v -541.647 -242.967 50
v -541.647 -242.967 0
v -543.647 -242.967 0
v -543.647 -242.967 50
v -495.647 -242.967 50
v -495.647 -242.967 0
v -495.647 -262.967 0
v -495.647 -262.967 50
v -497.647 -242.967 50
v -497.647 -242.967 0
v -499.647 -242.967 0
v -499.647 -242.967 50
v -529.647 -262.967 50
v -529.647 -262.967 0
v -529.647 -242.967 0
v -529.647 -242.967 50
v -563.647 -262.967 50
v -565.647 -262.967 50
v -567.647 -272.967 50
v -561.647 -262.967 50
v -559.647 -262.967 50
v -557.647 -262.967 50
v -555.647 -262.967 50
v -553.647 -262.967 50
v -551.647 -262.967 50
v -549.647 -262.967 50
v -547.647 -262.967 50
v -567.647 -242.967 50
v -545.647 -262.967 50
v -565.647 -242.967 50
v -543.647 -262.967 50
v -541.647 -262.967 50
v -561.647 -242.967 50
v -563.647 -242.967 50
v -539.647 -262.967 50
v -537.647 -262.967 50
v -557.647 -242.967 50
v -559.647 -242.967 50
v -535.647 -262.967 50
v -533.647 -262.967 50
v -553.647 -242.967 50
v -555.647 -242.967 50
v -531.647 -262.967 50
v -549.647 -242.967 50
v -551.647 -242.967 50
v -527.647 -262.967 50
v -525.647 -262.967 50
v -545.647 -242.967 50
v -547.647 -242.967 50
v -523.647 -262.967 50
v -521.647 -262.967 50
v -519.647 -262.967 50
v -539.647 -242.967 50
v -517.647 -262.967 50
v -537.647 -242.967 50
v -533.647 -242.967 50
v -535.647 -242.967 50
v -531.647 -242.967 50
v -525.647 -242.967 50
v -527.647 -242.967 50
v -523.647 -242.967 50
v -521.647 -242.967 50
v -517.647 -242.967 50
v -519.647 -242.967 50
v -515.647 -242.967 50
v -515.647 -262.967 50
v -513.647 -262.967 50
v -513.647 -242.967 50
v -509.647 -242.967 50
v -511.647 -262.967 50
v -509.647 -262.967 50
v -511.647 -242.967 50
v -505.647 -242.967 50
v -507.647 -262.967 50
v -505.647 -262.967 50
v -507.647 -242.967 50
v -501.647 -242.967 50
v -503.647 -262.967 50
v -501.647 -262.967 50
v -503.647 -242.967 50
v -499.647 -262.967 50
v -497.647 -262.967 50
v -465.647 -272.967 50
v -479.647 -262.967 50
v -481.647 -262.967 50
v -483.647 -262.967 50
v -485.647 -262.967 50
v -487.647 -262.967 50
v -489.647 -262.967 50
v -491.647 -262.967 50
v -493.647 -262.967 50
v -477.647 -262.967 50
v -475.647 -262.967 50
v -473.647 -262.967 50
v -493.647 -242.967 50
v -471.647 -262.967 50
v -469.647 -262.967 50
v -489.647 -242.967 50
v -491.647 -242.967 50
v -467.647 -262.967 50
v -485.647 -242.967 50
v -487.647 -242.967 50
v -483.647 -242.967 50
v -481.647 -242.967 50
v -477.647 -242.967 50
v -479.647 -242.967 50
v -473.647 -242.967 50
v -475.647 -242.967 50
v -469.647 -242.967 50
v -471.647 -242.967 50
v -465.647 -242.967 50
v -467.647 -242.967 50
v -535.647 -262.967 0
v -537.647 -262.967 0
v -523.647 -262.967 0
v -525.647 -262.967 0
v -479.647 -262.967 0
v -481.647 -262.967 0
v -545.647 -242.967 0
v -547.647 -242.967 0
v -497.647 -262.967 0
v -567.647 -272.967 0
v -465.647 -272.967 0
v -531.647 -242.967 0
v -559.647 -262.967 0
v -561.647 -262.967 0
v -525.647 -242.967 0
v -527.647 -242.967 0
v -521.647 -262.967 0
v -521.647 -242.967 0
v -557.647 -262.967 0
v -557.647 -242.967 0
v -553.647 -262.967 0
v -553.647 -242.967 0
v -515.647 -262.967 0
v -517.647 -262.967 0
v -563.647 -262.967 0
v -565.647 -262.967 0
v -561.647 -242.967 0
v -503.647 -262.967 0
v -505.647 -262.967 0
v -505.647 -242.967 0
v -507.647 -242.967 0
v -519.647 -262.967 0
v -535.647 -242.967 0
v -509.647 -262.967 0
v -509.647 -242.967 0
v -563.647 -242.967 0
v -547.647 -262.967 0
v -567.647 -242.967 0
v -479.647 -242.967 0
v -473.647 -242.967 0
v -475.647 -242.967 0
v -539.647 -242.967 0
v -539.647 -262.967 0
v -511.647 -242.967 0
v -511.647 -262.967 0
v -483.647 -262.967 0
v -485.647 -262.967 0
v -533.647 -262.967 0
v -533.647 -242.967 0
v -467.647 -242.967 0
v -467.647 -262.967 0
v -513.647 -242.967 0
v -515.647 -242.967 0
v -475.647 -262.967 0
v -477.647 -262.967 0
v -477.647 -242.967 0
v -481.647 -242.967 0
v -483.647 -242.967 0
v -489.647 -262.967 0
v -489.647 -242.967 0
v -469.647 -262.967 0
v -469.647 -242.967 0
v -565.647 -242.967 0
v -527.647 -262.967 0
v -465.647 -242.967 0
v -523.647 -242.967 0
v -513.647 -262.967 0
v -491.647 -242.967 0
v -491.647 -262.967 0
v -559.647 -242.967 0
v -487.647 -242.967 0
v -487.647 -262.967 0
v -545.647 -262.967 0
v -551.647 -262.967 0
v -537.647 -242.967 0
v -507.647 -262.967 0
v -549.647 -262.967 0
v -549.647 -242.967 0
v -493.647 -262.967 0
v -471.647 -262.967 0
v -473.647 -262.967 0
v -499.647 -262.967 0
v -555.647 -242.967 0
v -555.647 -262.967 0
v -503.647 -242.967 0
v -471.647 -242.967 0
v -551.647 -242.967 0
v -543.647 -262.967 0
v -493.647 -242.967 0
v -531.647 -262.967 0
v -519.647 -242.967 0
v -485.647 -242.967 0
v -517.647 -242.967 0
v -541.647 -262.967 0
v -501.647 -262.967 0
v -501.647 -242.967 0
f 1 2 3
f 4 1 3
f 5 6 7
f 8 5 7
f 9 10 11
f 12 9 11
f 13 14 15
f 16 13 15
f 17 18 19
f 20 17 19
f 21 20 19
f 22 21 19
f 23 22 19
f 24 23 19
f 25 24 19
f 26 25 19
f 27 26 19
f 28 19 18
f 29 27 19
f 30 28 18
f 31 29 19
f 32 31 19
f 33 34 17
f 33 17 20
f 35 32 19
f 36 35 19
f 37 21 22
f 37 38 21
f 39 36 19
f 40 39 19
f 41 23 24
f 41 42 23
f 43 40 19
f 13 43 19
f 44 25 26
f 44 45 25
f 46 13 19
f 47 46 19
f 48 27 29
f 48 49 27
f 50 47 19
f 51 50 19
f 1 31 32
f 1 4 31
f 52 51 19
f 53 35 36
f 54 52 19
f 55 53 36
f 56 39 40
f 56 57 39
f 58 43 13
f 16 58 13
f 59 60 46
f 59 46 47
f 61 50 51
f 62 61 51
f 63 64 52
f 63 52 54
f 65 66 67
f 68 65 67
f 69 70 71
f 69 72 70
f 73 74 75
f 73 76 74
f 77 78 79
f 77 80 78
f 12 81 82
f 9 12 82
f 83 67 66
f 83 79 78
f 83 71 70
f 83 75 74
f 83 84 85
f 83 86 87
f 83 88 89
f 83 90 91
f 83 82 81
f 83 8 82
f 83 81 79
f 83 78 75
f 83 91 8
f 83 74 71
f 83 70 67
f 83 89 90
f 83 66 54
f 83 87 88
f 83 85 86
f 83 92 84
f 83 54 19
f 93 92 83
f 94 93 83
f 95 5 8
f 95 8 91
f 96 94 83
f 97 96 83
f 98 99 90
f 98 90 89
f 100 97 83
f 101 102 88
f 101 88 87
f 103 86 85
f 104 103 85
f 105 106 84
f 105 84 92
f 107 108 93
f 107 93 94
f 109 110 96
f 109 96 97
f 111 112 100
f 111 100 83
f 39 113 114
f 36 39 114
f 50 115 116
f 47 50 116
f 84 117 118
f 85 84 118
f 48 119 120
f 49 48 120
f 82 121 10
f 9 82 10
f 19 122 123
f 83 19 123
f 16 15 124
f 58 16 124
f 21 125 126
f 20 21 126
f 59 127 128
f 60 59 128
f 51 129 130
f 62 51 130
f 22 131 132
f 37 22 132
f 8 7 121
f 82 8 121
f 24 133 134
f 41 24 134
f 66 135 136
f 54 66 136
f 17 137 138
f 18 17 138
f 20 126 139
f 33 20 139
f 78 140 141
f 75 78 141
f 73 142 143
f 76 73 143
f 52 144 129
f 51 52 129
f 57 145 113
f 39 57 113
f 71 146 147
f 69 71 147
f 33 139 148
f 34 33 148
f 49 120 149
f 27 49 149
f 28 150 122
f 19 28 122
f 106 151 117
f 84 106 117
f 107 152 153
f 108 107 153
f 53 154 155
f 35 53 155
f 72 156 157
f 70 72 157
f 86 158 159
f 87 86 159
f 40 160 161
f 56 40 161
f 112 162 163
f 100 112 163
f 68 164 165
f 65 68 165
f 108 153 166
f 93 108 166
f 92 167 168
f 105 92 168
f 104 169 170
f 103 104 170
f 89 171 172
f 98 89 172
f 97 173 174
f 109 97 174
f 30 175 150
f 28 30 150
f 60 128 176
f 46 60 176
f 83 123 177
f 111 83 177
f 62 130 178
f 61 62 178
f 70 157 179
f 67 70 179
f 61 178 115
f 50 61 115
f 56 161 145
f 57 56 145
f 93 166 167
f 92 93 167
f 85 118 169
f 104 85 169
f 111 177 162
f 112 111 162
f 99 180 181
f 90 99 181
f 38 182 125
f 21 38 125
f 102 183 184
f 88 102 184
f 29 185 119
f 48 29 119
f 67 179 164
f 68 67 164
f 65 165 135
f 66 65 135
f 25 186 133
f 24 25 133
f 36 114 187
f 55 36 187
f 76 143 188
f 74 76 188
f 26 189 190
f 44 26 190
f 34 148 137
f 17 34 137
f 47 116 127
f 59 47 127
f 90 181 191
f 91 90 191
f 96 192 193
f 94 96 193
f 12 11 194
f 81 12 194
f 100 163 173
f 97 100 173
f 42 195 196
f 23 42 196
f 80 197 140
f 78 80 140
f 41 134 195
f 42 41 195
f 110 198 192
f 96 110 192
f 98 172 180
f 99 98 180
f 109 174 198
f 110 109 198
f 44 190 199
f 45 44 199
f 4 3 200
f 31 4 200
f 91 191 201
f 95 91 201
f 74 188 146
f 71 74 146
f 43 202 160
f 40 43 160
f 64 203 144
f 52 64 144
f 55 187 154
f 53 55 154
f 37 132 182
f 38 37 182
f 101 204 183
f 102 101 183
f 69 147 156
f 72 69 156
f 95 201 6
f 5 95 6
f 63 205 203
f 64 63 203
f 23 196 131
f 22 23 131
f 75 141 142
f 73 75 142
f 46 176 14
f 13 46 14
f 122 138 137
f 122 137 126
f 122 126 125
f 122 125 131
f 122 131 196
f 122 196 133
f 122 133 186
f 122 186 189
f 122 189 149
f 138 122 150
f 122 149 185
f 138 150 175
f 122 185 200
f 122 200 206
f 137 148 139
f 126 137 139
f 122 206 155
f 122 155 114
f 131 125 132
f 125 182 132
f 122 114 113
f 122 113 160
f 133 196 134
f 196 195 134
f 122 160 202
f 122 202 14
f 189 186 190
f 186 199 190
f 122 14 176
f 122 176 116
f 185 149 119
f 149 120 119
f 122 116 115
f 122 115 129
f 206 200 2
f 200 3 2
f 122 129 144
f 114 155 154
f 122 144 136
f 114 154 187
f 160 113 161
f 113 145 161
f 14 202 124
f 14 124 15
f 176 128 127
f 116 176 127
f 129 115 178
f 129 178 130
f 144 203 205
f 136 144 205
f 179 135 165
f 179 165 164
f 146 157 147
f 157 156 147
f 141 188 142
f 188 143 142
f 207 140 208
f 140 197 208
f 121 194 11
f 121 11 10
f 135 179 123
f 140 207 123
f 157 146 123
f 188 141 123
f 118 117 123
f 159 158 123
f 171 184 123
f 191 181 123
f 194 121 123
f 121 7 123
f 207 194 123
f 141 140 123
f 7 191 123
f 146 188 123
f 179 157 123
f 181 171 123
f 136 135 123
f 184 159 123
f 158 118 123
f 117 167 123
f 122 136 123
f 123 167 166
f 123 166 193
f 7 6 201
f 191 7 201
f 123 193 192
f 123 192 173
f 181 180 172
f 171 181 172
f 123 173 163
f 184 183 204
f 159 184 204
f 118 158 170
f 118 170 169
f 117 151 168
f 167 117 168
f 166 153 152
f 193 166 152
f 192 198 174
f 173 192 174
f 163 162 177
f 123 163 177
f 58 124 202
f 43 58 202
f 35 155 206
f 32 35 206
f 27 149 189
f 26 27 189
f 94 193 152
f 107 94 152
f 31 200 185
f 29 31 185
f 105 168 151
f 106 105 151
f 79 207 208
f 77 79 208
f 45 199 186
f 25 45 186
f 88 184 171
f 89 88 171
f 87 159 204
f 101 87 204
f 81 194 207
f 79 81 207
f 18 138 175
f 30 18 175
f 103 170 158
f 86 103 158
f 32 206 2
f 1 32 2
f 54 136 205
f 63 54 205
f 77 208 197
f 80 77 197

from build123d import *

# Parameters (mm, degrees)
F1_DEPTH = 50


with BuildPart() as f1:
    # F0 (on Top) → F1 (new body)
    with BuildSketch(Plane.XY):
        Polygon((-567.647423, -242.966514), (-567.647423, -272.966514), (-465.647423, -272.966514), (-465.647423, -242.966514), (-467.647423, -242.966514), (-467.647423, -262.966514), (-469.647423, -262.966514), (-469.647423, -242.966514), (-471.647423, -242.966514), (-471.647423, -262.966514), (-473.647423, -262.966514), (-473.647423, -242.966514), (-475.647423, -242.966514), (-475.647423, -262.966514), (-477.647423, -262.966514), (-477.647423, -242.966514), (-479.647423, -242.966514), (-479.647423, -262.966514), (-481.647423, -262.966514), (-481.647423, -242.966514), (-483.647423, -242.966514), (-483.647423, -262.966514), (-485.647423, -262.966514), (-485.647423, -242.966514), (-487.647423, -242.966514), (-487.647423, -262.966514), (-489.647423, -262.966514), (-489.647423, -242.966514), (-491.647423, -242.966514), (-491.647423, -262.966514), (-493.647423, -262.966514), (-493.647423, -242.966514), (-495.647423, -242.966514), (-495.647423, -262.966514), (-497.647423, -262.966514), (-497.647423, -242.966514), (-499.647423, -242.966514), (-499.647423, -262.966514), (-501.647423, -262.966514), (-501.647423, -242.966514), (-503.647423, -242.966514), (-503.647423, -262.966514), (-505.647423, -262.966514), (-505.647423, -242.966514), (-507.647423, -242.966514), (-507.647423, -262.966514), (-509.647423, -262.966514), (-509.647423, -242.966514), (-511.647423, -242.966514), (-511.647423, -262.966514), (-513.647423, -262.966514), (-513.647423, -242.966514), (-515.647423, -242.966514), (-515.647423, -262.966514), (-517.647423, -262.966514), (-517.647423, -242.966514), (-519.647423, -242.966514), (-519.647423, -262.966514), (-521.647423, -262.966514), (-521.647423, -242.966514), (-523.647423, -242.966514), (-523.647423, -262.966514), (-525.647423, -262.966514), (-525.647423, -242.966514), (-527.647423, -242.966514), (-527.647423, -262.966514), (-529.647423, -262.966514), (-529.647423, -242.966514), (-531.647423, -242.966514), (-531.647423, -262.966514), (-533.647423, -262.966514), (-533.647423, -242.966514), (-535.647423, -242.966514), (-535.647423, -262.966514), (-537.647423, -262.966514), (-537.647423, -242.966514), (-539.647423, -242.966514), (-539.647423, -262.966514), (-541.647423, -262.966514), (-541.647423, -242.966514), (-543.647423, -242.966514), (-543.647423, -262.966514), (-545.647423, -262.966514), (-545.647423, -242.966514), (-547.647423, -242.966514), (-547.647423, -262.966514), (-549.647423, -262.966514), (-549.647423, -242.966514), (-551.647423, -242.966514), (-551.647423, -262.966514), (-553.647423, -262.966514), (-553.647423, -242.966514), (-555.647423, -242.966514), (-555.647423, -262.966514), (-557.647423, -262.966514), (-557.647423, -242.966514), (-559.647423, -242.966514), (-559.647423, -262.966514), (-561.647423, -262.966514), (-561.647423, -242.966514), (-563.647423, -242.966514), (-563.647423, -262.966514), (-565.647423, -262.966514), (-565.647423, -242.966514), align=None)
    extrude(amount=F1_DEPTH)


solid = f1.part
